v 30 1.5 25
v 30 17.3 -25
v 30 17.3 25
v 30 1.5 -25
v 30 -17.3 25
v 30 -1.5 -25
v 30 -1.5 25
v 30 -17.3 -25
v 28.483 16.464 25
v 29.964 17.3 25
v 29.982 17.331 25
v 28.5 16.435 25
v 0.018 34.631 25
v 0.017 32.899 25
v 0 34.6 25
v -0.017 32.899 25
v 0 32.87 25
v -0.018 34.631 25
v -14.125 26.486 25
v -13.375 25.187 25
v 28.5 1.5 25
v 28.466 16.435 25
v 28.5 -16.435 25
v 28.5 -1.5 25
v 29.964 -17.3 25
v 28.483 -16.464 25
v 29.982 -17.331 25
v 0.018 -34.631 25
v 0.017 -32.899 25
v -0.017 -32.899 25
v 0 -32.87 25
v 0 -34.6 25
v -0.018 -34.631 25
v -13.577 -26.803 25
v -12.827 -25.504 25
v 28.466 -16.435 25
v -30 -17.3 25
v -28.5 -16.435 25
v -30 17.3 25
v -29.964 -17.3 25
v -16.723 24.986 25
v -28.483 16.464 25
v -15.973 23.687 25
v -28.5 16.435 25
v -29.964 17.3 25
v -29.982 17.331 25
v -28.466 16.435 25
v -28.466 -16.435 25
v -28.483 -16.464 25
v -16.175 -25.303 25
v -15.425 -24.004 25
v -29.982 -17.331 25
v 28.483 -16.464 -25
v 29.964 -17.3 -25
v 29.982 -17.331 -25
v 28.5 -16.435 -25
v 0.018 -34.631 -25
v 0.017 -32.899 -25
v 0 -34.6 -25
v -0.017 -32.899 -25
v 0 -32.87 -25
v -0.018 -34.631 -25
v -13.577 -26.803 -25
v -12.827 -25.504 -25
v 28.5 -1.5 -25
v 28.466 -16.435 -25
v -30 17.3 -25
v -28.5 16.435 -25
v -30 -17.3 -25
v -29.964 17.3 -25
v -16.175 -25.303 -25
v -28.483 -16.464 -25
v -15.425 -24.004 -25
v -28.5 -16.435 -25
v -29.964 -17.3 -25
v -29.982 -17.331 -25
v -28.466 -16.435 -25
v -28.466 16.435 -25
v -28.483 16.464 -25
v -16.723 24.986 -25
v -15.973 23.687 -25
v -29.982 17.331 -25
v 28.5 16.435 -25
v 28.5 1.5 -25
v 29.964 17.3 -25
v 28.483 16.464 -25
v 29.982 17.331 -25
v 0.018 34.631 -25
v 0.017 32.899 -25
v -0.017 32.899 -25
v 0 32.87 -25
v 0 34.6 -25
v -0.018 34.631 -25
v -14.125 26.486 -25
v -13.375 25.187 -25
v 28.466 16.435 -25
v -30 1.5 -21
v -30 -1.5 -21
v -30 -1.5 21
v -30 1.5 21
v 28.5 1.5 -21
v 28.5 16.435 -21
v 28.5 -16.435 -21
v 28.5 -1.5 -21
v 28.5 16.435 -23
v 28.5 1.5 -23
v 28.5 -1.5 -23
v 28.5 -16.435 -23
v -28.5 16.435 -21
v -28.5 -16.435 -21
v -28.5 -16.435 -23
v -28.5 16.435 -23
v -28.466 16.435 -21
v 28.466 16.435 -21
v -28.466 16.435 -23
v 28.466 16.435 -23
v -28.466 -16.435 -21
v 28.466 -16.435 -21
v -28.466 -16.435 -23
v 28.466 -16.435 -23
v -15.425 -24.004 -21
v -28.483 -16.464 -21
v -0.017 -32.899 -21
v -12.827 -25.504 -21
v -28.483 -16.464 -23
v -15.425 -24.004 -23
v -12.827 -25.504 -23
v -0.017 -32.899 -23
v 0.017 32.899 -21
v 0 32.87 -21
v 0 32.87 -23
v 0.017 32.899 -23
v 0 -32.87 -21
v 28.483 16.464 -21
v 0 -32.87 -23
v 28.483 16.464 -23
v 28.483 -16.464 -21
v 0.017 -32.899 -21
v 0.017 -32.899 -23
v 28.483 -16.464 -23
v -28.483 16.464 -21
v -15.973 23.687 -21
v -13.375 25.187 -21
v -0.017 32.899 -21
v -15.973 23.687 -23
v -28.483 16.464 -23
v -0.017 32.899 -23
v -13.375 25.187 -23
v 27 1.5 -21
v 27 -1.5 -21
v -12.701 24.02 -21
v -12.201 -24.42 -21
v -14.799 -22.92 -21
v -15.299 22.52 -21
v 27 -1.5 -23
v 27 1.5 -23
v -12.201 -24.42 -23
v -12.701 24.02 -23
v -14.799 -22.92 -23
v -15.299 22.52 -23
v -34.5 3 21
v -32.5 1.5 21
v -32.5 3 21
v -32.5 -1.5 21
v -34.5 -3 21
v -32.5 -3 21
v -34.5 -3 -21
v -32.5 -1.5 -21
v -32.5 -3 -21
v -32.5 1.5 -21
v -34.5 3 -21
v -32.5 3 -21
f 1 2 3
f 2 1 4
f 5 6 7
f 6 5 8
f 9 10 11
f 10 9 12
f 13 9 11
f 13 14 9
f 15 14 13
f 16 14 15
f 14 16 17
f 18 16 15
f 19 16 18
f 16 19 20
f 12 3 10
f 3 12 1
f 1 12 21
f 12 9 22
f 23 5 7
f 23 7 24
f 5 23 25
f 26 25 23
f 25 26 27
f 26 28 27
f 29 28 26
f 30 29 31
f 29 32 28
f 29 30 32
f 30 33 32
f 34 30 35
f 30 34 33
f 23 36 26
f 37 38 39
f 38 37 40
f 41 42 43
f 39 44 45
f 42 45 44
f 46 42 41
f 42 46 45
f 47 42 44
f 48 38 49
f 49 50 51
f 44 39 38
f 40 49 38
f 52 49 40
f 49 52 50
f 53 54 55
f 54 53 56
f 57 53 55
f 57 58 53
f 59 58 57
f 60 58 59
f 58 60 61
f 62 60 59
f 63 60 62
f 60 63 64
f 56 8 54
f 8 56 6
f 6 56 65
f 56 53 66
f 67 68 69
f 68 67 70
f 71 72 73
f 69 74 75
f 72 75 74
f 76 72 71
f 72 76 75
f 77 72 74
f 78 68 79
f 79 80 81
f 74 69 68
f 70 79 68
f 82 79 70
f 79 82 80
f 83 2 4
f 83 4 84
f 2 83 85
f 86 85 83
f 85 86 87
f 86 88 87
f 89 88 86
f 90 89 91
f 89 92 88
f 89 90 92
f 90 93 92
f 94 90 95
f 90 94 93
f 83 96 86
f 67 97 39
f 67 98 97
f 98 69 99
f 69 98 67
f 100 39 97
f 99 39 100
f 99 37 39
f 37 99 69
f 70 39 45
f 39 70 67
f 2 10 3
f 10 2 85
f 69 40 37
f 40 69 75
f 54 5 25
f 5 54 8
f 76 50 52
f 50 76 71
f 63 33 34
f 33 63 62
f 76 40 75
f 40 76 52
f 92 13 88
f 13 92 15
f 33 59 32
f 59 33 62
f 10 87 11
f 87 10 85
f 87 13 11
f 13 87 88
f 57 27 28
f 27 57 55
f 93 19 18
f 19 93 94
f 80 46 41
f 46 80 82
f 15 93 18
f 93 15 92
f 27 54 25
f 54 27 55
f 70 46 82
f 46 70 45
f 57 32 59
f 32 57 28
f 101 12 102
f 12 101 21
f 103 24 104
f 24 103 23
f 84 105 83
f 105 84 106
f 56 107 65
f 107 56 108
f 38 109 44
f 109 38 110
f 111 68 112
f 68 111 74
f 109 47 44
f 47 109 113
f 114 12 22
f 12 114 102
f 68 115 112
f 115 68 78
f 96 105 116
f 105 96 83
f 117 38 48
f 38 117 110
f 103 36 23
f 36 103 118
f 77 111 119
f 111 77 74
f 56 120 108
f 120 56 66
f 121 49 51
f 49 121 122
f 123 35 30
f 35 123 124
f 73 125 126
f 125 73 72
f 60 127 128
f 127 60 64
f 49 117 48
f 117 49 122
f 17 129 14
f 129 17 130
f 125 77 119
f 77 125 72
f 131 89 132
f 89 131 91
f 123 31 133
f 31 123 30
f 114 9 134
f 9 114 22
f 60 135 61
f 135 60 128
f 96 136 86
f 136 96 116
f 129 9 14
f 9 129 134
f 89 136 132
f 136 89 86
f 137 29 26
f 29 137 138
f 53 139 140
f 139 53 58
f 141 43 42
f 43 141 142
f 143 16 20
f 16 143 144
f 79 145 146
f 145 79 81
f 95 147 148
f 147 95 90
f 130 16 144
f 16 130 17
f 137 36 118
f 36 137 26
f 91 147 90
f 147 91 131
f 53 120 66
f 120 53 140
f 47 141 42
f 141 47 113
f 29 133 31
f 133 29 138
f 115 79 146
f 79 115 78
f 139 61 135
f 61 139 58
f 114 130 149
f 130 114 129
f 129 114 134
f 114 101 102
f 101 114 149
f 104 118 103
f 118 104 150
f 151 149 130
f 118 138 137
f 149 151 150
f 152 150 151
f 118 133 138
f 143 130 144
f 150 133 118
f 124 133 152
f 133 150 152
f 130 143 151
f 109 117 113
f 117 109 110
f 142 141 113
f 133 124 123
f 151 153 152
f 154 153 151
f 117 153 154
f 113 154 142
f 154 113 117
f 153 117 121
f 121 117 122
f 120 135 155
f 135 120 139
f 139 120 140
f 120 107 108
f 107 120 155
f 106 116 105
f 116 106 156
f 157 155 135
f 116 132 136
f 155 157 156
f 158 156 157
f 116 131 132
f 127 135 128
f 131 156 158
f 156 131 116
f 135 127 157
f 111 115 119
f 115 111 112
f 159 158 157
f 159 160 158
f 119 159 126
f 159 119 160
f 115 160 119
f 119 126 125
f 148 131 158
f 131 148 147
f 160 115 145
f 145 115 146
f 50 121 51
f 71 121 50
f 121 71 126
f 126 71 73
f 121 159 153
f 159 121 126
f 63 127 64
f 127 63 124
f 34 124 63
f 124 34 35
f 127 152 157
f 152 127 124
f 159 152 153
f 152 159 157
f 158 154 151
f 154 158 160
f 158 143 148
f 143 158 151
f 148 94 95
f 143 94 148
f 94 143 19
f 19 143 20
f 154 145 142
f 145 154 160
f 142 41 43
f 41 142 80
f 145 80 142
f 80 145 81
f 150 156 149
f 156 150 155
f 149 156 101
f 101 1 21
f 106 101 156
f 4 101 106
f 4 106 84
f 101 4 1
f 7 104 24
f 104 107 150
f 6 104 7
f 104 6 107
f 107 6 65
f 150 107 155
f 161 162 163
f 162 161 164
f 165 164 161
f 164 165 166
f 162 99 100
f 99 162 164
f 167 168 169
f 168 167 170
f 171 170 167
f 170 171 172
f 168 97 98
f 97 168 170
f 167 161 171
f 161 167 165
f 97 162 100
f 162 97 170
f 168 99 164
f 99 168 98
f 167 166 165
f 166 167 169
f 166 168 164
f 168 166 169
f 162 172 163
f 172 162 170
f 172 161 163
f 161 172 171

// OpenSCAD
x = 60;
y = 34.6;
z = 50;

module hexagon()
{
	difference() {
		union() {
			cube([x,y,z], center=true);
			rotate([0,0,60]) cube([x,y,z], center=true);
			rotate([0,0,-60]) cube([x,y,z], center=true);
		}
		union() {
			cube([x*0.95,y*0.95,z*2], center=true);
			rotate([0,0,60]) cube([x*0.95,y*0.95,z*2], center=true);
			rotate([0,0,-60]) cube([x*0.95,y*0.95,z*2], center=true);
		}
	}

}


difference() {
	union() {
		hexagon();
		translate([0,0,-22])
			union() {
				cube([x,y,2], center=true);
				rotate([0,0,60]) cube([x,y,2], center=true);
				rotate([0,0,-60]) cube([x,y,2], center=true);
			}
		}
	union() {
		translate([-16,-28,0]) rotate([0,0,60]) cube([10,3,100], center=true);		
		//translate([-32,0,0]) rotate([0,0,0]) cube([10,3,100], center=true);
		translate([-16.5,27.6,0]) rotate([0,0,-60]) cube([10,3,100], center=true);
		//translate([16,28,0]) rotate([0,0,60]) cube([10,3,100], center=true);
		translate([32,0,0]) rotate([0,0,0]) cube([10,3,100], center=true);
		//translate([16.5,-27.6,0]) rotate([0,0,-60]) cube([10,3,100], center=true);
	}
}


		translate([-32,0,0]) rotate([0,0,0]) cube([5,3,42], center=true);
		translate([-33.5,0,0]) rotate([0,0,90]) cube([6,2,42], center=true);





	
